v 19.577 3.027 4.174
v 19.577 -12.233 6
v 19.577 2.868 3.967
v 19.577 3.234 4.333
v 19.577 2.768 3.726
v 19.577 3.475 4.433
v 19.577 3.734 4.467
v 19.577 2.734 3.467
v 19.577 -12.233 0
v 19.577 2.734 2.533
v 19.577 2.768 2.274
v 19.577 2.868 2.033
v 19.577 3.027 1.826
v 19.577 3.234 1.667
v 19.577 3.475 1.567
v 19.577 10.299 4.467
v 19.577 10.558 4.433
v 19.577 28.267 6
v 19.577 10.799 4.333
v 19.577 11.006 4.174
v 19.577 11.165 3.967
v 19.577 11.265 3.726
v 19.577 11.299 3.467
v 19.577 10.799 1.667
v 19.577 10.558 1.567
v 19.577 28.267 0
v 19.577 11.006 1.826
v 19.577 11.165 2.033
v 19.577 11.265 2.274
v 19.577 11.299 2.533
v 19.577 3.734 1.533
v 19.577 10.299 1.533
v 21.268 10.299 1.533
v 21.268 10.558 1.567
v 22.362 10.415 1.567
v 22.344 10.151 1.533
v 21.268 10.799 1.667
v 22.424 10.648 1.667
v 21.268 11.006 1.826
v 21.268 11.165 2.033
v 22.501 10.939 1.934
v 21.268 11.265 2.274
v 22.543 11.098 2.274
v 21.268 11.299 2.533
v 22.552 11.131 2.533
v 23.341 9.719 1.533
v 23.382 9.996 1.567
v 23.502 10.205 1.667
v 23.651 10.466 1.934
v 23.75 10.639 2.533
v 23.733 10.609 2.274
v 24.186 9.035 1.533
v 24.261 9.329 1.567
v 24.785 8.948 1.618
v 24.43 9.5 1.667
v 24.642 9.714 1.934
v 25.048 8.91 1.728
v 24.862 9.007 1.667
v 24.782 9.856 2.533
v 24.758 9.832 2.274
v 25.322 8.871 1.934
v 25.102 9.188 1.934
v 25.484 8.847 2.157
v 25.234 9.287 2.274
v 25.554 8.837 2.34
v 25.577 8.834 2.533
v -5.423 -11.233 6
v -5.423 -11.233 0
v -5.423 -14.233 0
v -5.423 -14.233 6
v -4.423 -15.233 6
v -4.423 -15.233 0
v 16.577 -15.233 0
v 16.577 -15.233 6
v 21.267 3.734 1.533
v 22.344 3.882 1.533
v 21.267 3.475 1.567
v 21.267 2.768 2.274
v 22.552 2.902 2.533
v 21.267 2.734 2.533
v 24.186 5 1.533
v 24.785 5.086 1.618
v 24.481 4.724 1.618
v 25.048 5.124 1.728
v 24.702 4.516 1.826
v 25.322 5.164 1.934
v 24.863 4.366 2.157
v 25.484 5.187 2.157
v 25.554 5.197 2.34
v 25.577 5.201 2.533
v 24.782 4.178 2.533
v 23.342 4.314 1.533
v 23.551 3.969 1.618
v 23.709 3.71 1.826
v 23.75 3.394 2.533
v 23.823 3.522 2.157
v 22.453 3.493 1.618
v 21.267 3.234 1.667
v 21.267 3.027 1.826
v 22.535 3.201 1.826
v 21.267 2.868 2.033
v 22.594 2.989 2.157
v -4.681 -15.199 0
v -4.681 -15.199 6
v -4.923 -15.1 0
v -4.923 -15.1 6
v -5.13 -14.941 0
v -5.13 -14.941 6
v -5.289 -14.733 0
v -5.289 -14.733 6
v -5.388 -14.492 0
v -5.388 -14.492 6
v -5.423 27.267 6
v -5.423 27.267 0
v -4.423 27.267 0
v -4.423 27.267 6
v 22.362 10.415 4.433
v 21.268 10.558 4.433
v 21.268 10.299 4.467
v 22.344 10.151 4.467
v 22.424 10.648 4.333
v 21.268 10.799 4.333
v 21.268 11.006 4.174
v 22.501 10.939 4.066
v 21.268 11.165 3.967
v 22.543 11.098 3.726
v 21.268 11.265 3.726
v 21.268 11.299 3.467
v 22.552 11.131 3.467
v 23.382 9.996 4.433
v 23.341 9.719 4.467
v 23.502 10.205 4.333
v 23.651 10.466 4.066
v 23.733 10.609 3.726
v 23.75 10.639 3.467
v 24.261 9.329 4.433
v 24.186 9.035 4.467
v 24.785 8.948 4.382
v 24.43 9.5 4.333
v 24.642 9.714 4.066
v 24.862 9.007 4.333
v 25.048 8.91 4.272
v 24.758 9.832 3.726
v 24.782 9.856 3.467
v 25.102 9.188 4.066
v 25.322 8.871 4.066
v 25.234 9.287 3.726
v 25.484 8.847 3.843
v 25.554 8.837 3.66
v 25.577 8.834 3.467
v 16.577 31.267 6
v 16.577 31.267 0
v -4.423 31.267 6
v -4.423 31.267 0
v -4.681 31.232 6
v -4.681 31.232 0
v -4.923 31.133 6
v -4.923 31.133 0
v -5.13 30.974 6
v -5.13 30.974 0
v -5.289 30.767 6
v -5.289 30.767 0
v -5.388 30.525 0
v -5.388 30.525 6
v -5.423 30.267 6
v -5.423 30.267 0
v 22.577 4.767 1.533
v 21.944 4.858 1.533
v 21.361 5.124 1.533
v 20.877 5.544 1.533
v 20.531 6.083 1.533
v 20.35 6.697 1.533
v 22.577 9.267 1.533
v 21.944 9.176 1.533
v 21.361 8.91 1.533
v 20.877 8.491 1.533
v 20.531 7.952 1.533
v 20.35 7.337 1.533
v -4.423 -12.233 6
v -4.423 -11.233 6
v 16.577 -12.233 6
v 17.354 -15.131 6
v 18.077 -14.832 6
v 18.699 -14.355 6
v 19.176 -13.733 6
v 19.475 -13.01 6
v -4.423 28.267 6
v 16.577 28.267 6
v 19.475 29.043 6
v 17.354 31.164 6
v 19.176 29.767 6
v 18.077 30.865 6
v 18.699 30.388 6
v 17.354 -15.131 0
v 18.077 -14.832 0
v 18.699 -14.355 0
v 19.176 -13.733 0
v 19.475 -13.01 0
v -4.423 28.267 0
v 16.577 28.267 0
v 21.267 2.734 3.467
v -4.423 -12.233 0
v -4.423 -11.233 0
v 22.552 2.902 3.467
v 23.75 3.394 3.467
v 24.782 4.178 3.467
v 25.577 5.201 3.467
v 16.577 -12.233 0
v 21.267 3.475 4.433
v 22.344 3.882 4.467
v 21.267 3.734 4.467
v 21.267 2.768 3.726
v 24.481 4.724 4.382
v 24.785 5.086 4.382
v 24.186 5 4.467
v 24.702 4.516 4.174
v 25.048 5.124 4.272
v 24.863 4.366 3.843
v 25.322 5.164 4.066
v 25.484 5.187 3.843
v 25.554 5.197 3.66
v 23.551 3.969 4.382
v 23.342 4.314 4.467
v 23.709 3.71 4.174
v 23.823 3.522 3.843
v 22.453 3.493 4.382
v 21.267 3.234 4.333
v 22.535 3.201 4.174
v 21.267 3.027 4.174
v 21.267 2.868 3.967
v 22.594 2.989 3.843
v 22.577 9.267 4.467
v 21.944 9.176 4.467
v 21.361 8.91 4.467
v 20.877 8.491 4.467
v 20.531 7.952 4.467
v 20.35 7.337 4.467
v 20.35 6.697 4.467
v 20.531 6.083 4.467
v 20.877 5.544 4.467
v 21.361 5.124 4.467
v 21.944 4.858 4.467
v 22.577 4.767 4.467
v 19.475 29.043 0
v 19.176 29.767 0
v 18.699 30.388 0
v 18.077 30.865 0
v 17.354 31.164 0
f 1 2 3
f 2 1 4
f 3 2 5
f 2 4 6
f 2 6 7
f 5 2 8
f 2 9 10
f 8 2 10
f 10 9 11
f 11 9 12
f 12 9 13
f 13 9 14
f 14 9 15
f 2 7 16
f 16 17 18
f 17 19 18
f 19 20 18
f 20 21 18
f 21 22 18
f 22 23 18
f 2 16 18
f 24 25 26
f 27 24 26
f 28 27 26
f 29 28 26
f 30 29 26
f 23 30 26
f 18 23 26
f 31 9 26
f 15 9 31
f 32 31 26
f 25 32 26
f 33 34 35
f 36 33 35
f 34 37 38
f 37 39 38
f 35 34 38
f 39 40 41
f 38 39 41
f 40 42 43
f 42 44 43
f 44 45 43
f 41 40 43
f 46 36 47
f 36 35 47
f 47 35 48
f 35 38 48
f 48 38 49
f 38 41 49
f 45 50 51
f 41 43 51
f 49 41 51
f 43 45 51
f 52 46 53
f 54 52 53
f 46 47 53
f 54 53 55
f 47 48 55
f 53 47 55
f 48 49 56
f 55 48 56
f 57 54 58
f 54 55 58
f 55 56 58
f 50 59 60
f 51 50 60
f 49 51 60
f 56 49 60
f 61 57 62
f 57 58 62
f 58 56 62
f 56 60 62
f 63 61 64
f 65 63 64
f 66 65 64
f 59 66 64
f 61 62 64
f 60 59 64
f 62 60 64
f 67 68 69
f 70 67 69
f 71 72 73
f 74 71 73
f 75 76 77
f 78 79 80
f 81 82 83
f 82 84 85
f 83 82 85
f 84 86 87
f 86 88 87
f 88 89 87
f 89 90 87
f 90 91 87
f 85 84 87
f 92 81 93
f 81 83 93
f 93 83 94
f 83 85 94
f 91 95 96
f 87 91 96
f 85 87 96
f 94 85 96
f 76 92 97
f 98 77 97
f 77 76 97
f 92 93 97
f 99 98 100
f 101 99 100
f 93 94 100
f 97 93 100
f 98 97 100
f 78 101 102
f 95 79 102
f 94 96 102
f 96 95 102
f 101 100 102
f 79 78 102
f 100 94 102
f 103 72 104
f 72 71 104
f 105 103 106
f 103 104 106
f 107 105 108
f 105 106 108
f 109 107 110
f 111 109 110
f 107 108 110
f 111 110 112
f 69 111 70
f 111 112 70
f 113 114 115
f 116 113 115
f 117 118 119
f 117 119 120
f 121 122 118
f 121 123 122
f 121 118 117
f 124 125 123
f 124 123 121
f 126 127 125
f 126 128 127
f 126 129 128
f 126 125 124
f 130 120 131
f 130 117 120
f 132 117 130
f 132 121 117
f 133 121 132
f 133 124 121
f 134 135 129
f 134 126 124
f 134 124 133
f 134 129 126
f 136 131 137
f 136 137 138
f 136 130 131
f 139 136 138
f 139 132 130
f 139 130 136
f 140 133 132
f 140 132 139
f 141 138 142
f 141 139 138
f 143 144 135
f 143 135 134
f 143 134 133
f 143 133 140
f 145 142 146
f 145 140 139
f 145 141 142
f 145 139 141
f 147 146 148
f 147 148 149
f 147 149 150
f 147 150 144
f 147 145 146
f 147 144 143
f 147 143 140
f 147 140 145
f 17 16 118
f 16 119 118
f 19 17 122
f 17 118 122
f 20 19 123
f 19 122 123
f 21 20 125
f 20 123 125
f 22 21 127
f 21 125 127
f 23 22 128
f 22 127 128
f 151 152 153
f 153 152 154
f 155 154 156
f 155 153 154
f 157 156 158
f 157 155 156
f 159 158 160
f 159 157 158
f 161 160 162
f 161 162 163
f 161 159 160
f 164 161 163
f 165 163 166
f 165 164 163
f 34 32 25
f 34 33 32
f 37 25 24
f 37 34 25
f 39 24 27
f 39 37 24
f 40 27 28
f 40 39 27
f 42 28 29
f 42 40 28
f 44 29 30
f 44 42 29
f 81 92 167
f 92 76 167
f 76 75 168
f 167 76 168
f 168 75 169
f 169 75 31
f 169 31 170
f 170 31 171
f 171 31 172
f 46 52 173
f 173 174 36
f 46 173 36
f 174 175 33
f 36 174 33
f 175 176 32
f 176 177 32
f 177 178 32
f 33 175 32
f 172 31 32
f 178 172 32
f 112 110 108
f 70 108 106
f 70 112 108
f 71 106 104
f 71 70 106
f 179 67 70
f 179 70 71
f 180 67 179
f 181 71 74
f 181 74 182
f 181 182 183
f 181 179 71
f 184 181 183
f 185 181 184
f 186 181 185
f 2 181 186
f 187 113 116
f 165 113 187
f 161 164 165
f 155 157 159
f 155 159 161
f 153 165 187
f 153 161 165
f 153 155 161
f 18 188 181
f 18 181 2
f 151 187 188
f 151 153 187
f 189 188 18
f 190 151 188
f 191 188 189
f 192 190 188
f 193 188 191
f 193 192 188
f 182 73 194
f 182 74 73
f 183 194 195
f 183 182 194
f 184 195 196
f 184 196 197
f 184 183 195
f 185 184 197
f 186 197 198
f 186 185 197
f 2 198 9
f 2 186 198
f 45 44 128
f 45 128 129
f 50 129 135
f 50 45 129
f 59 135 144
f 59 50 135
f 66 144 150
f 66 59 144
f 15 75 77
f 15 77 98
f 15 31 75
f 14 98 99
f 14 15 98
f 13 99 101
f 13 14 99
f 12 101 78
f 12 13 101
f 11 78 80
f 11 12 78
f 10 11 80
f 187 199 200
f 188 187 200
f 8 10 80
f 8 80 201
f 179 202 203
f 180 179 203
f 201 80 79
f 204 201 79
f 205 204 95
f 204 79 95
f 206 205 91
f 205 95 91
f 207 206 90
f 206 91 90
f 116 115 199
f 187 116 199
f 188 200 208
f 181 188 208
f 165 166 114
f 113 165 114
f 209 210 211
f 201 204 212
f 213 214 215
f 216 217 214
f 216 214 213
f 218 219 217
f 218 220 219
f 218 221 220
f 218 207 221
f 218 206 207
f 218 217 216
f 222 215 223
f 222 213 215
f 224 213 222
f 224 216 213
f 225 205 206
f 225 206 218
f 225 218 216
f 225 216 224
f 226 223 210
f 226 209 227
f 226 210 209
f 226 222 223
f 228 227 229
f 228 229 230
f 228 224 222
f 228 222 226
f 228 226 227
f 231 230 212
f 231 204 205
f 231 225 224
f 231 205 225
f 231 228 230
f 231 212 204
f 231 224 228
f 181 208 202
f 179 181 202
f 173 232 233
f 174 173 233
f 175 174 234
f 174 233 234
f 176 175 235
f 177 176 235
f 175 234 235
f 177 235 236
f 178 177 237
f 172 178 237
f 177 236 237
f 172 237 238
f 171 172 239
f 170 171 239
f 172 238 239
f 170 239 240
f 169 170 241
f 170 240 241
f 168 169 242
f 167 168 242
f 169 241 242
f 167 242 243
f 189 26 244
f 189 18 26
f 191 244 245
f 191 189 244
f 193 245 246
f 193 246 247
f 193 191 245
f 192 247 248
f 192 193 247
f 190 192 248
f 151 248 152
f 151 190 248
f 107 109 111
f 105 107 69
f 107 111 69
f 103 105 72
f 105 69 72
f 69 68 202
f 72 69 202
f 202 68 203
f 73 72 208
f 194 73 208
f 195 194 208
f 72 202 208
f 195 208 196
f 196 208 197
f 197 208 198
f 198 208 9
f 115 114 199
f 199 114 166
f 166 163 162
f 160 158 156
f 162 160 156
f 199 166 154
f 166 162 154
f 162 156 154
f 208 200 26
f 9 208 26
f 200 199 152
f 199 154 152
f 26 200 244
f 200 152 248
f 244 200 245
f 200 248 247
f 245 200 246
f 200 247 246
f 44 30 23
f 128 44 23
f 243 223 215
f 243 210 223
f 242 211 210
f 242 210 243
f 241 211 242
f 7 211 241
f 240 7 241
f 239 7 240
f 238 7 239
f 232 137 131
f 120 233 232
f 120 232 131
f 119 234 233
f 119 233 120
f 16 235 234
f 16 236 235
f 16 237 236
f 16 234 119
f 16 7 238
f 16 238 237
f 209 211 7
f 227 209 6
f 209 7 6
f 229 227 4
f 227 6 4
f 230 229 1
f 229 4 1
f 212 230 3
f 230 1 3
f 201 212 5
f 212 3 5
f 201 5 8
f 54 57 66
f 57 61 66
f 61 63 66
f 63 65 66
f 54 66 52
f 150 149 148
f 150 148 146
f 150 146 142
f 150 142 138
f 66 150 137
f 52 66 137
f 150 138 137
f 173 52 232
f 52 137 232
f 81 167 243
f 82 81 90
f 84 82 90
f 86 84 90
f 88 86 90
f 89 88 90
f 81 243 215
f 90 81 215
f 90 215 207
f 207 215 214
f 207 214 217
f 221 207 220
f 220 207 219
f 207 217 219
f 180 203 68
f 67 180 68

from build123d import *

# Parameters (mm, degrees)
F1_DEPTH    = 6
F2_W        = 8.5644074716
F2_H        = 2.9347334579
F3_DEPTH    = 6
F5_DEPTH    = 25
F6_T1_DEPTH = 24.4869357348
F6_T3_DEPTH = 24.4827319302
F7_R        = 3
F8_R        = 1


# Not quite as in the source:
# - a fillet or chamfer that OpenCascade refuses, or shapes differently, is made with other operations: its cross-section is extruded or revolved along the edge and cut away or added


with BuildPart() as f1:
    # F0 (on Top) → F1 (new body)
    with BuildSketch(Plane.XY):
        Polygon((-4.42252215, 28.2665032521), (16.57747785, 28.2665032521), (16.57747785, -12.2334967479), (-4.42252215, -12.2334967479), (-4.42252215, -11.2334967479), (-5.42252215, -11.2334967479), (-5.42252215, -13.2334967479), (-5.42252215, -15.2334967479), (-4.42252215, -15.2334967479), (16.57747785, -15.2334967479), (19.57747785, -15.2334967479), (19.57747785, -13.2334967479), (19.57747785, 27.2665032521), (19.57747785, 31.2665032521), (16.57747785, 31.2665032521), (-4.42252215, 31.2665032521), (-5.42252215, 31.2665032521), (-5.42252215, 27.2665032521), (-4.42252215, 27.2665032521), align=None)
    extrude(amount=F1_DEPTH)

    # F2 (on face) → F3 (join)
    with BuildSketch(Plane.YZ.offset(19.57747785)):
        with Locations((7.0165032521, 3)):
            Rectangle(F2_W, F2_H)
    extrude(amount=F3_DEPTH)

    # F4 (on face) → F5 (cut)
    with BuildSketch(Plane.XY.offset(4.4673667289)):
        with BuildLine():
            Line((25.57747785, 8.833928965), (22.57747785, 9.2672181241))
            ThreePointArc((22.57747785, 9.2672181241), (20.32747785, 7.0172181241), (22.57747785, 4.7672181241))
            Line((22.57747785, 4.7672181241), (25.57747785, 5.2005072832))
            Line((25.57747785, 5.2005072832), (25.57747785, 8.833928965))
        make_face()
    extrude(amount=-F5_DEPTH, mode=Mode.SUBTRACT)

    # F6: fillet of radius 5 on 2 edges, made by hand

    # F6_s2 → F6_t1 (cut)
    with BuildSketch(Plane.XY.offset(-9.2434678674)):
        with BuildLine():
            ThreePointArc((21.2670373946, 2.7342995163), (23.7500837932, 3.3944284833), (25.57747785, 5.2005072832))
            Line((25.57747785, 5.2005072832), (25.57747785, 2.7342995163))
            Line((25.57747785, 2.7342995163), (21.2670373946, 2.7342995163))
        make_face()
    extrude(amount=F6_T1_DEPTH, mode=Mode.SUBTRACT)

    # F6_s4 → F6_t3 (cut)
    with BuildSketch(Plane.XY.offset(-9.2413659651)):
        with BuildLine():
            ThreePointArc((21.2678781556, 11.2987069879), (23.7502046967, 10.6389898062), (25.57747785, 8.833928965))
            Line((25.57747785, 8.833928965), (25.57747785, 11.2987069879))
            Line((25.57747785, 11.2987069879), (21.2678781556, 11.2987069879))
        make_face()
    extrude(amount=F6_T3_DEPTH, mode=Mode.SUBTRACT)

    # F7
    f7_edges = [f1.edges().sort_by_distance(p)[0] for p in [
        (19.577478, -15.233497, 3),
        (19.577478, 31.266503, 3),
    ]]
    fillet(f7_edges, radius=F7_R)

    # F8
    f8_edges = [f1.edges().sort_by_distance(p)[0] for p in [
        (-5.422522, -15.233497, 3),
        (-5.422522, 31.266503, 3),
        (23.750084, 3.394428, 4.467367),
        (23.750084, 3.394428, 1.532633),
        (23.750205, 10.63899, 1.532633),
        (23.750205, 10.63899, 4.467367),
        (20.422678, 11.298707, 1.532633),
        (20.422258, 2.7343, 1.532633),
        (20.422258, 2.7343, 4.467367),
        (20.422678, 11.298707, 4.467367),
    ]]
    fillet(f8_edges, radius=F8_R)


solid = f1.part
